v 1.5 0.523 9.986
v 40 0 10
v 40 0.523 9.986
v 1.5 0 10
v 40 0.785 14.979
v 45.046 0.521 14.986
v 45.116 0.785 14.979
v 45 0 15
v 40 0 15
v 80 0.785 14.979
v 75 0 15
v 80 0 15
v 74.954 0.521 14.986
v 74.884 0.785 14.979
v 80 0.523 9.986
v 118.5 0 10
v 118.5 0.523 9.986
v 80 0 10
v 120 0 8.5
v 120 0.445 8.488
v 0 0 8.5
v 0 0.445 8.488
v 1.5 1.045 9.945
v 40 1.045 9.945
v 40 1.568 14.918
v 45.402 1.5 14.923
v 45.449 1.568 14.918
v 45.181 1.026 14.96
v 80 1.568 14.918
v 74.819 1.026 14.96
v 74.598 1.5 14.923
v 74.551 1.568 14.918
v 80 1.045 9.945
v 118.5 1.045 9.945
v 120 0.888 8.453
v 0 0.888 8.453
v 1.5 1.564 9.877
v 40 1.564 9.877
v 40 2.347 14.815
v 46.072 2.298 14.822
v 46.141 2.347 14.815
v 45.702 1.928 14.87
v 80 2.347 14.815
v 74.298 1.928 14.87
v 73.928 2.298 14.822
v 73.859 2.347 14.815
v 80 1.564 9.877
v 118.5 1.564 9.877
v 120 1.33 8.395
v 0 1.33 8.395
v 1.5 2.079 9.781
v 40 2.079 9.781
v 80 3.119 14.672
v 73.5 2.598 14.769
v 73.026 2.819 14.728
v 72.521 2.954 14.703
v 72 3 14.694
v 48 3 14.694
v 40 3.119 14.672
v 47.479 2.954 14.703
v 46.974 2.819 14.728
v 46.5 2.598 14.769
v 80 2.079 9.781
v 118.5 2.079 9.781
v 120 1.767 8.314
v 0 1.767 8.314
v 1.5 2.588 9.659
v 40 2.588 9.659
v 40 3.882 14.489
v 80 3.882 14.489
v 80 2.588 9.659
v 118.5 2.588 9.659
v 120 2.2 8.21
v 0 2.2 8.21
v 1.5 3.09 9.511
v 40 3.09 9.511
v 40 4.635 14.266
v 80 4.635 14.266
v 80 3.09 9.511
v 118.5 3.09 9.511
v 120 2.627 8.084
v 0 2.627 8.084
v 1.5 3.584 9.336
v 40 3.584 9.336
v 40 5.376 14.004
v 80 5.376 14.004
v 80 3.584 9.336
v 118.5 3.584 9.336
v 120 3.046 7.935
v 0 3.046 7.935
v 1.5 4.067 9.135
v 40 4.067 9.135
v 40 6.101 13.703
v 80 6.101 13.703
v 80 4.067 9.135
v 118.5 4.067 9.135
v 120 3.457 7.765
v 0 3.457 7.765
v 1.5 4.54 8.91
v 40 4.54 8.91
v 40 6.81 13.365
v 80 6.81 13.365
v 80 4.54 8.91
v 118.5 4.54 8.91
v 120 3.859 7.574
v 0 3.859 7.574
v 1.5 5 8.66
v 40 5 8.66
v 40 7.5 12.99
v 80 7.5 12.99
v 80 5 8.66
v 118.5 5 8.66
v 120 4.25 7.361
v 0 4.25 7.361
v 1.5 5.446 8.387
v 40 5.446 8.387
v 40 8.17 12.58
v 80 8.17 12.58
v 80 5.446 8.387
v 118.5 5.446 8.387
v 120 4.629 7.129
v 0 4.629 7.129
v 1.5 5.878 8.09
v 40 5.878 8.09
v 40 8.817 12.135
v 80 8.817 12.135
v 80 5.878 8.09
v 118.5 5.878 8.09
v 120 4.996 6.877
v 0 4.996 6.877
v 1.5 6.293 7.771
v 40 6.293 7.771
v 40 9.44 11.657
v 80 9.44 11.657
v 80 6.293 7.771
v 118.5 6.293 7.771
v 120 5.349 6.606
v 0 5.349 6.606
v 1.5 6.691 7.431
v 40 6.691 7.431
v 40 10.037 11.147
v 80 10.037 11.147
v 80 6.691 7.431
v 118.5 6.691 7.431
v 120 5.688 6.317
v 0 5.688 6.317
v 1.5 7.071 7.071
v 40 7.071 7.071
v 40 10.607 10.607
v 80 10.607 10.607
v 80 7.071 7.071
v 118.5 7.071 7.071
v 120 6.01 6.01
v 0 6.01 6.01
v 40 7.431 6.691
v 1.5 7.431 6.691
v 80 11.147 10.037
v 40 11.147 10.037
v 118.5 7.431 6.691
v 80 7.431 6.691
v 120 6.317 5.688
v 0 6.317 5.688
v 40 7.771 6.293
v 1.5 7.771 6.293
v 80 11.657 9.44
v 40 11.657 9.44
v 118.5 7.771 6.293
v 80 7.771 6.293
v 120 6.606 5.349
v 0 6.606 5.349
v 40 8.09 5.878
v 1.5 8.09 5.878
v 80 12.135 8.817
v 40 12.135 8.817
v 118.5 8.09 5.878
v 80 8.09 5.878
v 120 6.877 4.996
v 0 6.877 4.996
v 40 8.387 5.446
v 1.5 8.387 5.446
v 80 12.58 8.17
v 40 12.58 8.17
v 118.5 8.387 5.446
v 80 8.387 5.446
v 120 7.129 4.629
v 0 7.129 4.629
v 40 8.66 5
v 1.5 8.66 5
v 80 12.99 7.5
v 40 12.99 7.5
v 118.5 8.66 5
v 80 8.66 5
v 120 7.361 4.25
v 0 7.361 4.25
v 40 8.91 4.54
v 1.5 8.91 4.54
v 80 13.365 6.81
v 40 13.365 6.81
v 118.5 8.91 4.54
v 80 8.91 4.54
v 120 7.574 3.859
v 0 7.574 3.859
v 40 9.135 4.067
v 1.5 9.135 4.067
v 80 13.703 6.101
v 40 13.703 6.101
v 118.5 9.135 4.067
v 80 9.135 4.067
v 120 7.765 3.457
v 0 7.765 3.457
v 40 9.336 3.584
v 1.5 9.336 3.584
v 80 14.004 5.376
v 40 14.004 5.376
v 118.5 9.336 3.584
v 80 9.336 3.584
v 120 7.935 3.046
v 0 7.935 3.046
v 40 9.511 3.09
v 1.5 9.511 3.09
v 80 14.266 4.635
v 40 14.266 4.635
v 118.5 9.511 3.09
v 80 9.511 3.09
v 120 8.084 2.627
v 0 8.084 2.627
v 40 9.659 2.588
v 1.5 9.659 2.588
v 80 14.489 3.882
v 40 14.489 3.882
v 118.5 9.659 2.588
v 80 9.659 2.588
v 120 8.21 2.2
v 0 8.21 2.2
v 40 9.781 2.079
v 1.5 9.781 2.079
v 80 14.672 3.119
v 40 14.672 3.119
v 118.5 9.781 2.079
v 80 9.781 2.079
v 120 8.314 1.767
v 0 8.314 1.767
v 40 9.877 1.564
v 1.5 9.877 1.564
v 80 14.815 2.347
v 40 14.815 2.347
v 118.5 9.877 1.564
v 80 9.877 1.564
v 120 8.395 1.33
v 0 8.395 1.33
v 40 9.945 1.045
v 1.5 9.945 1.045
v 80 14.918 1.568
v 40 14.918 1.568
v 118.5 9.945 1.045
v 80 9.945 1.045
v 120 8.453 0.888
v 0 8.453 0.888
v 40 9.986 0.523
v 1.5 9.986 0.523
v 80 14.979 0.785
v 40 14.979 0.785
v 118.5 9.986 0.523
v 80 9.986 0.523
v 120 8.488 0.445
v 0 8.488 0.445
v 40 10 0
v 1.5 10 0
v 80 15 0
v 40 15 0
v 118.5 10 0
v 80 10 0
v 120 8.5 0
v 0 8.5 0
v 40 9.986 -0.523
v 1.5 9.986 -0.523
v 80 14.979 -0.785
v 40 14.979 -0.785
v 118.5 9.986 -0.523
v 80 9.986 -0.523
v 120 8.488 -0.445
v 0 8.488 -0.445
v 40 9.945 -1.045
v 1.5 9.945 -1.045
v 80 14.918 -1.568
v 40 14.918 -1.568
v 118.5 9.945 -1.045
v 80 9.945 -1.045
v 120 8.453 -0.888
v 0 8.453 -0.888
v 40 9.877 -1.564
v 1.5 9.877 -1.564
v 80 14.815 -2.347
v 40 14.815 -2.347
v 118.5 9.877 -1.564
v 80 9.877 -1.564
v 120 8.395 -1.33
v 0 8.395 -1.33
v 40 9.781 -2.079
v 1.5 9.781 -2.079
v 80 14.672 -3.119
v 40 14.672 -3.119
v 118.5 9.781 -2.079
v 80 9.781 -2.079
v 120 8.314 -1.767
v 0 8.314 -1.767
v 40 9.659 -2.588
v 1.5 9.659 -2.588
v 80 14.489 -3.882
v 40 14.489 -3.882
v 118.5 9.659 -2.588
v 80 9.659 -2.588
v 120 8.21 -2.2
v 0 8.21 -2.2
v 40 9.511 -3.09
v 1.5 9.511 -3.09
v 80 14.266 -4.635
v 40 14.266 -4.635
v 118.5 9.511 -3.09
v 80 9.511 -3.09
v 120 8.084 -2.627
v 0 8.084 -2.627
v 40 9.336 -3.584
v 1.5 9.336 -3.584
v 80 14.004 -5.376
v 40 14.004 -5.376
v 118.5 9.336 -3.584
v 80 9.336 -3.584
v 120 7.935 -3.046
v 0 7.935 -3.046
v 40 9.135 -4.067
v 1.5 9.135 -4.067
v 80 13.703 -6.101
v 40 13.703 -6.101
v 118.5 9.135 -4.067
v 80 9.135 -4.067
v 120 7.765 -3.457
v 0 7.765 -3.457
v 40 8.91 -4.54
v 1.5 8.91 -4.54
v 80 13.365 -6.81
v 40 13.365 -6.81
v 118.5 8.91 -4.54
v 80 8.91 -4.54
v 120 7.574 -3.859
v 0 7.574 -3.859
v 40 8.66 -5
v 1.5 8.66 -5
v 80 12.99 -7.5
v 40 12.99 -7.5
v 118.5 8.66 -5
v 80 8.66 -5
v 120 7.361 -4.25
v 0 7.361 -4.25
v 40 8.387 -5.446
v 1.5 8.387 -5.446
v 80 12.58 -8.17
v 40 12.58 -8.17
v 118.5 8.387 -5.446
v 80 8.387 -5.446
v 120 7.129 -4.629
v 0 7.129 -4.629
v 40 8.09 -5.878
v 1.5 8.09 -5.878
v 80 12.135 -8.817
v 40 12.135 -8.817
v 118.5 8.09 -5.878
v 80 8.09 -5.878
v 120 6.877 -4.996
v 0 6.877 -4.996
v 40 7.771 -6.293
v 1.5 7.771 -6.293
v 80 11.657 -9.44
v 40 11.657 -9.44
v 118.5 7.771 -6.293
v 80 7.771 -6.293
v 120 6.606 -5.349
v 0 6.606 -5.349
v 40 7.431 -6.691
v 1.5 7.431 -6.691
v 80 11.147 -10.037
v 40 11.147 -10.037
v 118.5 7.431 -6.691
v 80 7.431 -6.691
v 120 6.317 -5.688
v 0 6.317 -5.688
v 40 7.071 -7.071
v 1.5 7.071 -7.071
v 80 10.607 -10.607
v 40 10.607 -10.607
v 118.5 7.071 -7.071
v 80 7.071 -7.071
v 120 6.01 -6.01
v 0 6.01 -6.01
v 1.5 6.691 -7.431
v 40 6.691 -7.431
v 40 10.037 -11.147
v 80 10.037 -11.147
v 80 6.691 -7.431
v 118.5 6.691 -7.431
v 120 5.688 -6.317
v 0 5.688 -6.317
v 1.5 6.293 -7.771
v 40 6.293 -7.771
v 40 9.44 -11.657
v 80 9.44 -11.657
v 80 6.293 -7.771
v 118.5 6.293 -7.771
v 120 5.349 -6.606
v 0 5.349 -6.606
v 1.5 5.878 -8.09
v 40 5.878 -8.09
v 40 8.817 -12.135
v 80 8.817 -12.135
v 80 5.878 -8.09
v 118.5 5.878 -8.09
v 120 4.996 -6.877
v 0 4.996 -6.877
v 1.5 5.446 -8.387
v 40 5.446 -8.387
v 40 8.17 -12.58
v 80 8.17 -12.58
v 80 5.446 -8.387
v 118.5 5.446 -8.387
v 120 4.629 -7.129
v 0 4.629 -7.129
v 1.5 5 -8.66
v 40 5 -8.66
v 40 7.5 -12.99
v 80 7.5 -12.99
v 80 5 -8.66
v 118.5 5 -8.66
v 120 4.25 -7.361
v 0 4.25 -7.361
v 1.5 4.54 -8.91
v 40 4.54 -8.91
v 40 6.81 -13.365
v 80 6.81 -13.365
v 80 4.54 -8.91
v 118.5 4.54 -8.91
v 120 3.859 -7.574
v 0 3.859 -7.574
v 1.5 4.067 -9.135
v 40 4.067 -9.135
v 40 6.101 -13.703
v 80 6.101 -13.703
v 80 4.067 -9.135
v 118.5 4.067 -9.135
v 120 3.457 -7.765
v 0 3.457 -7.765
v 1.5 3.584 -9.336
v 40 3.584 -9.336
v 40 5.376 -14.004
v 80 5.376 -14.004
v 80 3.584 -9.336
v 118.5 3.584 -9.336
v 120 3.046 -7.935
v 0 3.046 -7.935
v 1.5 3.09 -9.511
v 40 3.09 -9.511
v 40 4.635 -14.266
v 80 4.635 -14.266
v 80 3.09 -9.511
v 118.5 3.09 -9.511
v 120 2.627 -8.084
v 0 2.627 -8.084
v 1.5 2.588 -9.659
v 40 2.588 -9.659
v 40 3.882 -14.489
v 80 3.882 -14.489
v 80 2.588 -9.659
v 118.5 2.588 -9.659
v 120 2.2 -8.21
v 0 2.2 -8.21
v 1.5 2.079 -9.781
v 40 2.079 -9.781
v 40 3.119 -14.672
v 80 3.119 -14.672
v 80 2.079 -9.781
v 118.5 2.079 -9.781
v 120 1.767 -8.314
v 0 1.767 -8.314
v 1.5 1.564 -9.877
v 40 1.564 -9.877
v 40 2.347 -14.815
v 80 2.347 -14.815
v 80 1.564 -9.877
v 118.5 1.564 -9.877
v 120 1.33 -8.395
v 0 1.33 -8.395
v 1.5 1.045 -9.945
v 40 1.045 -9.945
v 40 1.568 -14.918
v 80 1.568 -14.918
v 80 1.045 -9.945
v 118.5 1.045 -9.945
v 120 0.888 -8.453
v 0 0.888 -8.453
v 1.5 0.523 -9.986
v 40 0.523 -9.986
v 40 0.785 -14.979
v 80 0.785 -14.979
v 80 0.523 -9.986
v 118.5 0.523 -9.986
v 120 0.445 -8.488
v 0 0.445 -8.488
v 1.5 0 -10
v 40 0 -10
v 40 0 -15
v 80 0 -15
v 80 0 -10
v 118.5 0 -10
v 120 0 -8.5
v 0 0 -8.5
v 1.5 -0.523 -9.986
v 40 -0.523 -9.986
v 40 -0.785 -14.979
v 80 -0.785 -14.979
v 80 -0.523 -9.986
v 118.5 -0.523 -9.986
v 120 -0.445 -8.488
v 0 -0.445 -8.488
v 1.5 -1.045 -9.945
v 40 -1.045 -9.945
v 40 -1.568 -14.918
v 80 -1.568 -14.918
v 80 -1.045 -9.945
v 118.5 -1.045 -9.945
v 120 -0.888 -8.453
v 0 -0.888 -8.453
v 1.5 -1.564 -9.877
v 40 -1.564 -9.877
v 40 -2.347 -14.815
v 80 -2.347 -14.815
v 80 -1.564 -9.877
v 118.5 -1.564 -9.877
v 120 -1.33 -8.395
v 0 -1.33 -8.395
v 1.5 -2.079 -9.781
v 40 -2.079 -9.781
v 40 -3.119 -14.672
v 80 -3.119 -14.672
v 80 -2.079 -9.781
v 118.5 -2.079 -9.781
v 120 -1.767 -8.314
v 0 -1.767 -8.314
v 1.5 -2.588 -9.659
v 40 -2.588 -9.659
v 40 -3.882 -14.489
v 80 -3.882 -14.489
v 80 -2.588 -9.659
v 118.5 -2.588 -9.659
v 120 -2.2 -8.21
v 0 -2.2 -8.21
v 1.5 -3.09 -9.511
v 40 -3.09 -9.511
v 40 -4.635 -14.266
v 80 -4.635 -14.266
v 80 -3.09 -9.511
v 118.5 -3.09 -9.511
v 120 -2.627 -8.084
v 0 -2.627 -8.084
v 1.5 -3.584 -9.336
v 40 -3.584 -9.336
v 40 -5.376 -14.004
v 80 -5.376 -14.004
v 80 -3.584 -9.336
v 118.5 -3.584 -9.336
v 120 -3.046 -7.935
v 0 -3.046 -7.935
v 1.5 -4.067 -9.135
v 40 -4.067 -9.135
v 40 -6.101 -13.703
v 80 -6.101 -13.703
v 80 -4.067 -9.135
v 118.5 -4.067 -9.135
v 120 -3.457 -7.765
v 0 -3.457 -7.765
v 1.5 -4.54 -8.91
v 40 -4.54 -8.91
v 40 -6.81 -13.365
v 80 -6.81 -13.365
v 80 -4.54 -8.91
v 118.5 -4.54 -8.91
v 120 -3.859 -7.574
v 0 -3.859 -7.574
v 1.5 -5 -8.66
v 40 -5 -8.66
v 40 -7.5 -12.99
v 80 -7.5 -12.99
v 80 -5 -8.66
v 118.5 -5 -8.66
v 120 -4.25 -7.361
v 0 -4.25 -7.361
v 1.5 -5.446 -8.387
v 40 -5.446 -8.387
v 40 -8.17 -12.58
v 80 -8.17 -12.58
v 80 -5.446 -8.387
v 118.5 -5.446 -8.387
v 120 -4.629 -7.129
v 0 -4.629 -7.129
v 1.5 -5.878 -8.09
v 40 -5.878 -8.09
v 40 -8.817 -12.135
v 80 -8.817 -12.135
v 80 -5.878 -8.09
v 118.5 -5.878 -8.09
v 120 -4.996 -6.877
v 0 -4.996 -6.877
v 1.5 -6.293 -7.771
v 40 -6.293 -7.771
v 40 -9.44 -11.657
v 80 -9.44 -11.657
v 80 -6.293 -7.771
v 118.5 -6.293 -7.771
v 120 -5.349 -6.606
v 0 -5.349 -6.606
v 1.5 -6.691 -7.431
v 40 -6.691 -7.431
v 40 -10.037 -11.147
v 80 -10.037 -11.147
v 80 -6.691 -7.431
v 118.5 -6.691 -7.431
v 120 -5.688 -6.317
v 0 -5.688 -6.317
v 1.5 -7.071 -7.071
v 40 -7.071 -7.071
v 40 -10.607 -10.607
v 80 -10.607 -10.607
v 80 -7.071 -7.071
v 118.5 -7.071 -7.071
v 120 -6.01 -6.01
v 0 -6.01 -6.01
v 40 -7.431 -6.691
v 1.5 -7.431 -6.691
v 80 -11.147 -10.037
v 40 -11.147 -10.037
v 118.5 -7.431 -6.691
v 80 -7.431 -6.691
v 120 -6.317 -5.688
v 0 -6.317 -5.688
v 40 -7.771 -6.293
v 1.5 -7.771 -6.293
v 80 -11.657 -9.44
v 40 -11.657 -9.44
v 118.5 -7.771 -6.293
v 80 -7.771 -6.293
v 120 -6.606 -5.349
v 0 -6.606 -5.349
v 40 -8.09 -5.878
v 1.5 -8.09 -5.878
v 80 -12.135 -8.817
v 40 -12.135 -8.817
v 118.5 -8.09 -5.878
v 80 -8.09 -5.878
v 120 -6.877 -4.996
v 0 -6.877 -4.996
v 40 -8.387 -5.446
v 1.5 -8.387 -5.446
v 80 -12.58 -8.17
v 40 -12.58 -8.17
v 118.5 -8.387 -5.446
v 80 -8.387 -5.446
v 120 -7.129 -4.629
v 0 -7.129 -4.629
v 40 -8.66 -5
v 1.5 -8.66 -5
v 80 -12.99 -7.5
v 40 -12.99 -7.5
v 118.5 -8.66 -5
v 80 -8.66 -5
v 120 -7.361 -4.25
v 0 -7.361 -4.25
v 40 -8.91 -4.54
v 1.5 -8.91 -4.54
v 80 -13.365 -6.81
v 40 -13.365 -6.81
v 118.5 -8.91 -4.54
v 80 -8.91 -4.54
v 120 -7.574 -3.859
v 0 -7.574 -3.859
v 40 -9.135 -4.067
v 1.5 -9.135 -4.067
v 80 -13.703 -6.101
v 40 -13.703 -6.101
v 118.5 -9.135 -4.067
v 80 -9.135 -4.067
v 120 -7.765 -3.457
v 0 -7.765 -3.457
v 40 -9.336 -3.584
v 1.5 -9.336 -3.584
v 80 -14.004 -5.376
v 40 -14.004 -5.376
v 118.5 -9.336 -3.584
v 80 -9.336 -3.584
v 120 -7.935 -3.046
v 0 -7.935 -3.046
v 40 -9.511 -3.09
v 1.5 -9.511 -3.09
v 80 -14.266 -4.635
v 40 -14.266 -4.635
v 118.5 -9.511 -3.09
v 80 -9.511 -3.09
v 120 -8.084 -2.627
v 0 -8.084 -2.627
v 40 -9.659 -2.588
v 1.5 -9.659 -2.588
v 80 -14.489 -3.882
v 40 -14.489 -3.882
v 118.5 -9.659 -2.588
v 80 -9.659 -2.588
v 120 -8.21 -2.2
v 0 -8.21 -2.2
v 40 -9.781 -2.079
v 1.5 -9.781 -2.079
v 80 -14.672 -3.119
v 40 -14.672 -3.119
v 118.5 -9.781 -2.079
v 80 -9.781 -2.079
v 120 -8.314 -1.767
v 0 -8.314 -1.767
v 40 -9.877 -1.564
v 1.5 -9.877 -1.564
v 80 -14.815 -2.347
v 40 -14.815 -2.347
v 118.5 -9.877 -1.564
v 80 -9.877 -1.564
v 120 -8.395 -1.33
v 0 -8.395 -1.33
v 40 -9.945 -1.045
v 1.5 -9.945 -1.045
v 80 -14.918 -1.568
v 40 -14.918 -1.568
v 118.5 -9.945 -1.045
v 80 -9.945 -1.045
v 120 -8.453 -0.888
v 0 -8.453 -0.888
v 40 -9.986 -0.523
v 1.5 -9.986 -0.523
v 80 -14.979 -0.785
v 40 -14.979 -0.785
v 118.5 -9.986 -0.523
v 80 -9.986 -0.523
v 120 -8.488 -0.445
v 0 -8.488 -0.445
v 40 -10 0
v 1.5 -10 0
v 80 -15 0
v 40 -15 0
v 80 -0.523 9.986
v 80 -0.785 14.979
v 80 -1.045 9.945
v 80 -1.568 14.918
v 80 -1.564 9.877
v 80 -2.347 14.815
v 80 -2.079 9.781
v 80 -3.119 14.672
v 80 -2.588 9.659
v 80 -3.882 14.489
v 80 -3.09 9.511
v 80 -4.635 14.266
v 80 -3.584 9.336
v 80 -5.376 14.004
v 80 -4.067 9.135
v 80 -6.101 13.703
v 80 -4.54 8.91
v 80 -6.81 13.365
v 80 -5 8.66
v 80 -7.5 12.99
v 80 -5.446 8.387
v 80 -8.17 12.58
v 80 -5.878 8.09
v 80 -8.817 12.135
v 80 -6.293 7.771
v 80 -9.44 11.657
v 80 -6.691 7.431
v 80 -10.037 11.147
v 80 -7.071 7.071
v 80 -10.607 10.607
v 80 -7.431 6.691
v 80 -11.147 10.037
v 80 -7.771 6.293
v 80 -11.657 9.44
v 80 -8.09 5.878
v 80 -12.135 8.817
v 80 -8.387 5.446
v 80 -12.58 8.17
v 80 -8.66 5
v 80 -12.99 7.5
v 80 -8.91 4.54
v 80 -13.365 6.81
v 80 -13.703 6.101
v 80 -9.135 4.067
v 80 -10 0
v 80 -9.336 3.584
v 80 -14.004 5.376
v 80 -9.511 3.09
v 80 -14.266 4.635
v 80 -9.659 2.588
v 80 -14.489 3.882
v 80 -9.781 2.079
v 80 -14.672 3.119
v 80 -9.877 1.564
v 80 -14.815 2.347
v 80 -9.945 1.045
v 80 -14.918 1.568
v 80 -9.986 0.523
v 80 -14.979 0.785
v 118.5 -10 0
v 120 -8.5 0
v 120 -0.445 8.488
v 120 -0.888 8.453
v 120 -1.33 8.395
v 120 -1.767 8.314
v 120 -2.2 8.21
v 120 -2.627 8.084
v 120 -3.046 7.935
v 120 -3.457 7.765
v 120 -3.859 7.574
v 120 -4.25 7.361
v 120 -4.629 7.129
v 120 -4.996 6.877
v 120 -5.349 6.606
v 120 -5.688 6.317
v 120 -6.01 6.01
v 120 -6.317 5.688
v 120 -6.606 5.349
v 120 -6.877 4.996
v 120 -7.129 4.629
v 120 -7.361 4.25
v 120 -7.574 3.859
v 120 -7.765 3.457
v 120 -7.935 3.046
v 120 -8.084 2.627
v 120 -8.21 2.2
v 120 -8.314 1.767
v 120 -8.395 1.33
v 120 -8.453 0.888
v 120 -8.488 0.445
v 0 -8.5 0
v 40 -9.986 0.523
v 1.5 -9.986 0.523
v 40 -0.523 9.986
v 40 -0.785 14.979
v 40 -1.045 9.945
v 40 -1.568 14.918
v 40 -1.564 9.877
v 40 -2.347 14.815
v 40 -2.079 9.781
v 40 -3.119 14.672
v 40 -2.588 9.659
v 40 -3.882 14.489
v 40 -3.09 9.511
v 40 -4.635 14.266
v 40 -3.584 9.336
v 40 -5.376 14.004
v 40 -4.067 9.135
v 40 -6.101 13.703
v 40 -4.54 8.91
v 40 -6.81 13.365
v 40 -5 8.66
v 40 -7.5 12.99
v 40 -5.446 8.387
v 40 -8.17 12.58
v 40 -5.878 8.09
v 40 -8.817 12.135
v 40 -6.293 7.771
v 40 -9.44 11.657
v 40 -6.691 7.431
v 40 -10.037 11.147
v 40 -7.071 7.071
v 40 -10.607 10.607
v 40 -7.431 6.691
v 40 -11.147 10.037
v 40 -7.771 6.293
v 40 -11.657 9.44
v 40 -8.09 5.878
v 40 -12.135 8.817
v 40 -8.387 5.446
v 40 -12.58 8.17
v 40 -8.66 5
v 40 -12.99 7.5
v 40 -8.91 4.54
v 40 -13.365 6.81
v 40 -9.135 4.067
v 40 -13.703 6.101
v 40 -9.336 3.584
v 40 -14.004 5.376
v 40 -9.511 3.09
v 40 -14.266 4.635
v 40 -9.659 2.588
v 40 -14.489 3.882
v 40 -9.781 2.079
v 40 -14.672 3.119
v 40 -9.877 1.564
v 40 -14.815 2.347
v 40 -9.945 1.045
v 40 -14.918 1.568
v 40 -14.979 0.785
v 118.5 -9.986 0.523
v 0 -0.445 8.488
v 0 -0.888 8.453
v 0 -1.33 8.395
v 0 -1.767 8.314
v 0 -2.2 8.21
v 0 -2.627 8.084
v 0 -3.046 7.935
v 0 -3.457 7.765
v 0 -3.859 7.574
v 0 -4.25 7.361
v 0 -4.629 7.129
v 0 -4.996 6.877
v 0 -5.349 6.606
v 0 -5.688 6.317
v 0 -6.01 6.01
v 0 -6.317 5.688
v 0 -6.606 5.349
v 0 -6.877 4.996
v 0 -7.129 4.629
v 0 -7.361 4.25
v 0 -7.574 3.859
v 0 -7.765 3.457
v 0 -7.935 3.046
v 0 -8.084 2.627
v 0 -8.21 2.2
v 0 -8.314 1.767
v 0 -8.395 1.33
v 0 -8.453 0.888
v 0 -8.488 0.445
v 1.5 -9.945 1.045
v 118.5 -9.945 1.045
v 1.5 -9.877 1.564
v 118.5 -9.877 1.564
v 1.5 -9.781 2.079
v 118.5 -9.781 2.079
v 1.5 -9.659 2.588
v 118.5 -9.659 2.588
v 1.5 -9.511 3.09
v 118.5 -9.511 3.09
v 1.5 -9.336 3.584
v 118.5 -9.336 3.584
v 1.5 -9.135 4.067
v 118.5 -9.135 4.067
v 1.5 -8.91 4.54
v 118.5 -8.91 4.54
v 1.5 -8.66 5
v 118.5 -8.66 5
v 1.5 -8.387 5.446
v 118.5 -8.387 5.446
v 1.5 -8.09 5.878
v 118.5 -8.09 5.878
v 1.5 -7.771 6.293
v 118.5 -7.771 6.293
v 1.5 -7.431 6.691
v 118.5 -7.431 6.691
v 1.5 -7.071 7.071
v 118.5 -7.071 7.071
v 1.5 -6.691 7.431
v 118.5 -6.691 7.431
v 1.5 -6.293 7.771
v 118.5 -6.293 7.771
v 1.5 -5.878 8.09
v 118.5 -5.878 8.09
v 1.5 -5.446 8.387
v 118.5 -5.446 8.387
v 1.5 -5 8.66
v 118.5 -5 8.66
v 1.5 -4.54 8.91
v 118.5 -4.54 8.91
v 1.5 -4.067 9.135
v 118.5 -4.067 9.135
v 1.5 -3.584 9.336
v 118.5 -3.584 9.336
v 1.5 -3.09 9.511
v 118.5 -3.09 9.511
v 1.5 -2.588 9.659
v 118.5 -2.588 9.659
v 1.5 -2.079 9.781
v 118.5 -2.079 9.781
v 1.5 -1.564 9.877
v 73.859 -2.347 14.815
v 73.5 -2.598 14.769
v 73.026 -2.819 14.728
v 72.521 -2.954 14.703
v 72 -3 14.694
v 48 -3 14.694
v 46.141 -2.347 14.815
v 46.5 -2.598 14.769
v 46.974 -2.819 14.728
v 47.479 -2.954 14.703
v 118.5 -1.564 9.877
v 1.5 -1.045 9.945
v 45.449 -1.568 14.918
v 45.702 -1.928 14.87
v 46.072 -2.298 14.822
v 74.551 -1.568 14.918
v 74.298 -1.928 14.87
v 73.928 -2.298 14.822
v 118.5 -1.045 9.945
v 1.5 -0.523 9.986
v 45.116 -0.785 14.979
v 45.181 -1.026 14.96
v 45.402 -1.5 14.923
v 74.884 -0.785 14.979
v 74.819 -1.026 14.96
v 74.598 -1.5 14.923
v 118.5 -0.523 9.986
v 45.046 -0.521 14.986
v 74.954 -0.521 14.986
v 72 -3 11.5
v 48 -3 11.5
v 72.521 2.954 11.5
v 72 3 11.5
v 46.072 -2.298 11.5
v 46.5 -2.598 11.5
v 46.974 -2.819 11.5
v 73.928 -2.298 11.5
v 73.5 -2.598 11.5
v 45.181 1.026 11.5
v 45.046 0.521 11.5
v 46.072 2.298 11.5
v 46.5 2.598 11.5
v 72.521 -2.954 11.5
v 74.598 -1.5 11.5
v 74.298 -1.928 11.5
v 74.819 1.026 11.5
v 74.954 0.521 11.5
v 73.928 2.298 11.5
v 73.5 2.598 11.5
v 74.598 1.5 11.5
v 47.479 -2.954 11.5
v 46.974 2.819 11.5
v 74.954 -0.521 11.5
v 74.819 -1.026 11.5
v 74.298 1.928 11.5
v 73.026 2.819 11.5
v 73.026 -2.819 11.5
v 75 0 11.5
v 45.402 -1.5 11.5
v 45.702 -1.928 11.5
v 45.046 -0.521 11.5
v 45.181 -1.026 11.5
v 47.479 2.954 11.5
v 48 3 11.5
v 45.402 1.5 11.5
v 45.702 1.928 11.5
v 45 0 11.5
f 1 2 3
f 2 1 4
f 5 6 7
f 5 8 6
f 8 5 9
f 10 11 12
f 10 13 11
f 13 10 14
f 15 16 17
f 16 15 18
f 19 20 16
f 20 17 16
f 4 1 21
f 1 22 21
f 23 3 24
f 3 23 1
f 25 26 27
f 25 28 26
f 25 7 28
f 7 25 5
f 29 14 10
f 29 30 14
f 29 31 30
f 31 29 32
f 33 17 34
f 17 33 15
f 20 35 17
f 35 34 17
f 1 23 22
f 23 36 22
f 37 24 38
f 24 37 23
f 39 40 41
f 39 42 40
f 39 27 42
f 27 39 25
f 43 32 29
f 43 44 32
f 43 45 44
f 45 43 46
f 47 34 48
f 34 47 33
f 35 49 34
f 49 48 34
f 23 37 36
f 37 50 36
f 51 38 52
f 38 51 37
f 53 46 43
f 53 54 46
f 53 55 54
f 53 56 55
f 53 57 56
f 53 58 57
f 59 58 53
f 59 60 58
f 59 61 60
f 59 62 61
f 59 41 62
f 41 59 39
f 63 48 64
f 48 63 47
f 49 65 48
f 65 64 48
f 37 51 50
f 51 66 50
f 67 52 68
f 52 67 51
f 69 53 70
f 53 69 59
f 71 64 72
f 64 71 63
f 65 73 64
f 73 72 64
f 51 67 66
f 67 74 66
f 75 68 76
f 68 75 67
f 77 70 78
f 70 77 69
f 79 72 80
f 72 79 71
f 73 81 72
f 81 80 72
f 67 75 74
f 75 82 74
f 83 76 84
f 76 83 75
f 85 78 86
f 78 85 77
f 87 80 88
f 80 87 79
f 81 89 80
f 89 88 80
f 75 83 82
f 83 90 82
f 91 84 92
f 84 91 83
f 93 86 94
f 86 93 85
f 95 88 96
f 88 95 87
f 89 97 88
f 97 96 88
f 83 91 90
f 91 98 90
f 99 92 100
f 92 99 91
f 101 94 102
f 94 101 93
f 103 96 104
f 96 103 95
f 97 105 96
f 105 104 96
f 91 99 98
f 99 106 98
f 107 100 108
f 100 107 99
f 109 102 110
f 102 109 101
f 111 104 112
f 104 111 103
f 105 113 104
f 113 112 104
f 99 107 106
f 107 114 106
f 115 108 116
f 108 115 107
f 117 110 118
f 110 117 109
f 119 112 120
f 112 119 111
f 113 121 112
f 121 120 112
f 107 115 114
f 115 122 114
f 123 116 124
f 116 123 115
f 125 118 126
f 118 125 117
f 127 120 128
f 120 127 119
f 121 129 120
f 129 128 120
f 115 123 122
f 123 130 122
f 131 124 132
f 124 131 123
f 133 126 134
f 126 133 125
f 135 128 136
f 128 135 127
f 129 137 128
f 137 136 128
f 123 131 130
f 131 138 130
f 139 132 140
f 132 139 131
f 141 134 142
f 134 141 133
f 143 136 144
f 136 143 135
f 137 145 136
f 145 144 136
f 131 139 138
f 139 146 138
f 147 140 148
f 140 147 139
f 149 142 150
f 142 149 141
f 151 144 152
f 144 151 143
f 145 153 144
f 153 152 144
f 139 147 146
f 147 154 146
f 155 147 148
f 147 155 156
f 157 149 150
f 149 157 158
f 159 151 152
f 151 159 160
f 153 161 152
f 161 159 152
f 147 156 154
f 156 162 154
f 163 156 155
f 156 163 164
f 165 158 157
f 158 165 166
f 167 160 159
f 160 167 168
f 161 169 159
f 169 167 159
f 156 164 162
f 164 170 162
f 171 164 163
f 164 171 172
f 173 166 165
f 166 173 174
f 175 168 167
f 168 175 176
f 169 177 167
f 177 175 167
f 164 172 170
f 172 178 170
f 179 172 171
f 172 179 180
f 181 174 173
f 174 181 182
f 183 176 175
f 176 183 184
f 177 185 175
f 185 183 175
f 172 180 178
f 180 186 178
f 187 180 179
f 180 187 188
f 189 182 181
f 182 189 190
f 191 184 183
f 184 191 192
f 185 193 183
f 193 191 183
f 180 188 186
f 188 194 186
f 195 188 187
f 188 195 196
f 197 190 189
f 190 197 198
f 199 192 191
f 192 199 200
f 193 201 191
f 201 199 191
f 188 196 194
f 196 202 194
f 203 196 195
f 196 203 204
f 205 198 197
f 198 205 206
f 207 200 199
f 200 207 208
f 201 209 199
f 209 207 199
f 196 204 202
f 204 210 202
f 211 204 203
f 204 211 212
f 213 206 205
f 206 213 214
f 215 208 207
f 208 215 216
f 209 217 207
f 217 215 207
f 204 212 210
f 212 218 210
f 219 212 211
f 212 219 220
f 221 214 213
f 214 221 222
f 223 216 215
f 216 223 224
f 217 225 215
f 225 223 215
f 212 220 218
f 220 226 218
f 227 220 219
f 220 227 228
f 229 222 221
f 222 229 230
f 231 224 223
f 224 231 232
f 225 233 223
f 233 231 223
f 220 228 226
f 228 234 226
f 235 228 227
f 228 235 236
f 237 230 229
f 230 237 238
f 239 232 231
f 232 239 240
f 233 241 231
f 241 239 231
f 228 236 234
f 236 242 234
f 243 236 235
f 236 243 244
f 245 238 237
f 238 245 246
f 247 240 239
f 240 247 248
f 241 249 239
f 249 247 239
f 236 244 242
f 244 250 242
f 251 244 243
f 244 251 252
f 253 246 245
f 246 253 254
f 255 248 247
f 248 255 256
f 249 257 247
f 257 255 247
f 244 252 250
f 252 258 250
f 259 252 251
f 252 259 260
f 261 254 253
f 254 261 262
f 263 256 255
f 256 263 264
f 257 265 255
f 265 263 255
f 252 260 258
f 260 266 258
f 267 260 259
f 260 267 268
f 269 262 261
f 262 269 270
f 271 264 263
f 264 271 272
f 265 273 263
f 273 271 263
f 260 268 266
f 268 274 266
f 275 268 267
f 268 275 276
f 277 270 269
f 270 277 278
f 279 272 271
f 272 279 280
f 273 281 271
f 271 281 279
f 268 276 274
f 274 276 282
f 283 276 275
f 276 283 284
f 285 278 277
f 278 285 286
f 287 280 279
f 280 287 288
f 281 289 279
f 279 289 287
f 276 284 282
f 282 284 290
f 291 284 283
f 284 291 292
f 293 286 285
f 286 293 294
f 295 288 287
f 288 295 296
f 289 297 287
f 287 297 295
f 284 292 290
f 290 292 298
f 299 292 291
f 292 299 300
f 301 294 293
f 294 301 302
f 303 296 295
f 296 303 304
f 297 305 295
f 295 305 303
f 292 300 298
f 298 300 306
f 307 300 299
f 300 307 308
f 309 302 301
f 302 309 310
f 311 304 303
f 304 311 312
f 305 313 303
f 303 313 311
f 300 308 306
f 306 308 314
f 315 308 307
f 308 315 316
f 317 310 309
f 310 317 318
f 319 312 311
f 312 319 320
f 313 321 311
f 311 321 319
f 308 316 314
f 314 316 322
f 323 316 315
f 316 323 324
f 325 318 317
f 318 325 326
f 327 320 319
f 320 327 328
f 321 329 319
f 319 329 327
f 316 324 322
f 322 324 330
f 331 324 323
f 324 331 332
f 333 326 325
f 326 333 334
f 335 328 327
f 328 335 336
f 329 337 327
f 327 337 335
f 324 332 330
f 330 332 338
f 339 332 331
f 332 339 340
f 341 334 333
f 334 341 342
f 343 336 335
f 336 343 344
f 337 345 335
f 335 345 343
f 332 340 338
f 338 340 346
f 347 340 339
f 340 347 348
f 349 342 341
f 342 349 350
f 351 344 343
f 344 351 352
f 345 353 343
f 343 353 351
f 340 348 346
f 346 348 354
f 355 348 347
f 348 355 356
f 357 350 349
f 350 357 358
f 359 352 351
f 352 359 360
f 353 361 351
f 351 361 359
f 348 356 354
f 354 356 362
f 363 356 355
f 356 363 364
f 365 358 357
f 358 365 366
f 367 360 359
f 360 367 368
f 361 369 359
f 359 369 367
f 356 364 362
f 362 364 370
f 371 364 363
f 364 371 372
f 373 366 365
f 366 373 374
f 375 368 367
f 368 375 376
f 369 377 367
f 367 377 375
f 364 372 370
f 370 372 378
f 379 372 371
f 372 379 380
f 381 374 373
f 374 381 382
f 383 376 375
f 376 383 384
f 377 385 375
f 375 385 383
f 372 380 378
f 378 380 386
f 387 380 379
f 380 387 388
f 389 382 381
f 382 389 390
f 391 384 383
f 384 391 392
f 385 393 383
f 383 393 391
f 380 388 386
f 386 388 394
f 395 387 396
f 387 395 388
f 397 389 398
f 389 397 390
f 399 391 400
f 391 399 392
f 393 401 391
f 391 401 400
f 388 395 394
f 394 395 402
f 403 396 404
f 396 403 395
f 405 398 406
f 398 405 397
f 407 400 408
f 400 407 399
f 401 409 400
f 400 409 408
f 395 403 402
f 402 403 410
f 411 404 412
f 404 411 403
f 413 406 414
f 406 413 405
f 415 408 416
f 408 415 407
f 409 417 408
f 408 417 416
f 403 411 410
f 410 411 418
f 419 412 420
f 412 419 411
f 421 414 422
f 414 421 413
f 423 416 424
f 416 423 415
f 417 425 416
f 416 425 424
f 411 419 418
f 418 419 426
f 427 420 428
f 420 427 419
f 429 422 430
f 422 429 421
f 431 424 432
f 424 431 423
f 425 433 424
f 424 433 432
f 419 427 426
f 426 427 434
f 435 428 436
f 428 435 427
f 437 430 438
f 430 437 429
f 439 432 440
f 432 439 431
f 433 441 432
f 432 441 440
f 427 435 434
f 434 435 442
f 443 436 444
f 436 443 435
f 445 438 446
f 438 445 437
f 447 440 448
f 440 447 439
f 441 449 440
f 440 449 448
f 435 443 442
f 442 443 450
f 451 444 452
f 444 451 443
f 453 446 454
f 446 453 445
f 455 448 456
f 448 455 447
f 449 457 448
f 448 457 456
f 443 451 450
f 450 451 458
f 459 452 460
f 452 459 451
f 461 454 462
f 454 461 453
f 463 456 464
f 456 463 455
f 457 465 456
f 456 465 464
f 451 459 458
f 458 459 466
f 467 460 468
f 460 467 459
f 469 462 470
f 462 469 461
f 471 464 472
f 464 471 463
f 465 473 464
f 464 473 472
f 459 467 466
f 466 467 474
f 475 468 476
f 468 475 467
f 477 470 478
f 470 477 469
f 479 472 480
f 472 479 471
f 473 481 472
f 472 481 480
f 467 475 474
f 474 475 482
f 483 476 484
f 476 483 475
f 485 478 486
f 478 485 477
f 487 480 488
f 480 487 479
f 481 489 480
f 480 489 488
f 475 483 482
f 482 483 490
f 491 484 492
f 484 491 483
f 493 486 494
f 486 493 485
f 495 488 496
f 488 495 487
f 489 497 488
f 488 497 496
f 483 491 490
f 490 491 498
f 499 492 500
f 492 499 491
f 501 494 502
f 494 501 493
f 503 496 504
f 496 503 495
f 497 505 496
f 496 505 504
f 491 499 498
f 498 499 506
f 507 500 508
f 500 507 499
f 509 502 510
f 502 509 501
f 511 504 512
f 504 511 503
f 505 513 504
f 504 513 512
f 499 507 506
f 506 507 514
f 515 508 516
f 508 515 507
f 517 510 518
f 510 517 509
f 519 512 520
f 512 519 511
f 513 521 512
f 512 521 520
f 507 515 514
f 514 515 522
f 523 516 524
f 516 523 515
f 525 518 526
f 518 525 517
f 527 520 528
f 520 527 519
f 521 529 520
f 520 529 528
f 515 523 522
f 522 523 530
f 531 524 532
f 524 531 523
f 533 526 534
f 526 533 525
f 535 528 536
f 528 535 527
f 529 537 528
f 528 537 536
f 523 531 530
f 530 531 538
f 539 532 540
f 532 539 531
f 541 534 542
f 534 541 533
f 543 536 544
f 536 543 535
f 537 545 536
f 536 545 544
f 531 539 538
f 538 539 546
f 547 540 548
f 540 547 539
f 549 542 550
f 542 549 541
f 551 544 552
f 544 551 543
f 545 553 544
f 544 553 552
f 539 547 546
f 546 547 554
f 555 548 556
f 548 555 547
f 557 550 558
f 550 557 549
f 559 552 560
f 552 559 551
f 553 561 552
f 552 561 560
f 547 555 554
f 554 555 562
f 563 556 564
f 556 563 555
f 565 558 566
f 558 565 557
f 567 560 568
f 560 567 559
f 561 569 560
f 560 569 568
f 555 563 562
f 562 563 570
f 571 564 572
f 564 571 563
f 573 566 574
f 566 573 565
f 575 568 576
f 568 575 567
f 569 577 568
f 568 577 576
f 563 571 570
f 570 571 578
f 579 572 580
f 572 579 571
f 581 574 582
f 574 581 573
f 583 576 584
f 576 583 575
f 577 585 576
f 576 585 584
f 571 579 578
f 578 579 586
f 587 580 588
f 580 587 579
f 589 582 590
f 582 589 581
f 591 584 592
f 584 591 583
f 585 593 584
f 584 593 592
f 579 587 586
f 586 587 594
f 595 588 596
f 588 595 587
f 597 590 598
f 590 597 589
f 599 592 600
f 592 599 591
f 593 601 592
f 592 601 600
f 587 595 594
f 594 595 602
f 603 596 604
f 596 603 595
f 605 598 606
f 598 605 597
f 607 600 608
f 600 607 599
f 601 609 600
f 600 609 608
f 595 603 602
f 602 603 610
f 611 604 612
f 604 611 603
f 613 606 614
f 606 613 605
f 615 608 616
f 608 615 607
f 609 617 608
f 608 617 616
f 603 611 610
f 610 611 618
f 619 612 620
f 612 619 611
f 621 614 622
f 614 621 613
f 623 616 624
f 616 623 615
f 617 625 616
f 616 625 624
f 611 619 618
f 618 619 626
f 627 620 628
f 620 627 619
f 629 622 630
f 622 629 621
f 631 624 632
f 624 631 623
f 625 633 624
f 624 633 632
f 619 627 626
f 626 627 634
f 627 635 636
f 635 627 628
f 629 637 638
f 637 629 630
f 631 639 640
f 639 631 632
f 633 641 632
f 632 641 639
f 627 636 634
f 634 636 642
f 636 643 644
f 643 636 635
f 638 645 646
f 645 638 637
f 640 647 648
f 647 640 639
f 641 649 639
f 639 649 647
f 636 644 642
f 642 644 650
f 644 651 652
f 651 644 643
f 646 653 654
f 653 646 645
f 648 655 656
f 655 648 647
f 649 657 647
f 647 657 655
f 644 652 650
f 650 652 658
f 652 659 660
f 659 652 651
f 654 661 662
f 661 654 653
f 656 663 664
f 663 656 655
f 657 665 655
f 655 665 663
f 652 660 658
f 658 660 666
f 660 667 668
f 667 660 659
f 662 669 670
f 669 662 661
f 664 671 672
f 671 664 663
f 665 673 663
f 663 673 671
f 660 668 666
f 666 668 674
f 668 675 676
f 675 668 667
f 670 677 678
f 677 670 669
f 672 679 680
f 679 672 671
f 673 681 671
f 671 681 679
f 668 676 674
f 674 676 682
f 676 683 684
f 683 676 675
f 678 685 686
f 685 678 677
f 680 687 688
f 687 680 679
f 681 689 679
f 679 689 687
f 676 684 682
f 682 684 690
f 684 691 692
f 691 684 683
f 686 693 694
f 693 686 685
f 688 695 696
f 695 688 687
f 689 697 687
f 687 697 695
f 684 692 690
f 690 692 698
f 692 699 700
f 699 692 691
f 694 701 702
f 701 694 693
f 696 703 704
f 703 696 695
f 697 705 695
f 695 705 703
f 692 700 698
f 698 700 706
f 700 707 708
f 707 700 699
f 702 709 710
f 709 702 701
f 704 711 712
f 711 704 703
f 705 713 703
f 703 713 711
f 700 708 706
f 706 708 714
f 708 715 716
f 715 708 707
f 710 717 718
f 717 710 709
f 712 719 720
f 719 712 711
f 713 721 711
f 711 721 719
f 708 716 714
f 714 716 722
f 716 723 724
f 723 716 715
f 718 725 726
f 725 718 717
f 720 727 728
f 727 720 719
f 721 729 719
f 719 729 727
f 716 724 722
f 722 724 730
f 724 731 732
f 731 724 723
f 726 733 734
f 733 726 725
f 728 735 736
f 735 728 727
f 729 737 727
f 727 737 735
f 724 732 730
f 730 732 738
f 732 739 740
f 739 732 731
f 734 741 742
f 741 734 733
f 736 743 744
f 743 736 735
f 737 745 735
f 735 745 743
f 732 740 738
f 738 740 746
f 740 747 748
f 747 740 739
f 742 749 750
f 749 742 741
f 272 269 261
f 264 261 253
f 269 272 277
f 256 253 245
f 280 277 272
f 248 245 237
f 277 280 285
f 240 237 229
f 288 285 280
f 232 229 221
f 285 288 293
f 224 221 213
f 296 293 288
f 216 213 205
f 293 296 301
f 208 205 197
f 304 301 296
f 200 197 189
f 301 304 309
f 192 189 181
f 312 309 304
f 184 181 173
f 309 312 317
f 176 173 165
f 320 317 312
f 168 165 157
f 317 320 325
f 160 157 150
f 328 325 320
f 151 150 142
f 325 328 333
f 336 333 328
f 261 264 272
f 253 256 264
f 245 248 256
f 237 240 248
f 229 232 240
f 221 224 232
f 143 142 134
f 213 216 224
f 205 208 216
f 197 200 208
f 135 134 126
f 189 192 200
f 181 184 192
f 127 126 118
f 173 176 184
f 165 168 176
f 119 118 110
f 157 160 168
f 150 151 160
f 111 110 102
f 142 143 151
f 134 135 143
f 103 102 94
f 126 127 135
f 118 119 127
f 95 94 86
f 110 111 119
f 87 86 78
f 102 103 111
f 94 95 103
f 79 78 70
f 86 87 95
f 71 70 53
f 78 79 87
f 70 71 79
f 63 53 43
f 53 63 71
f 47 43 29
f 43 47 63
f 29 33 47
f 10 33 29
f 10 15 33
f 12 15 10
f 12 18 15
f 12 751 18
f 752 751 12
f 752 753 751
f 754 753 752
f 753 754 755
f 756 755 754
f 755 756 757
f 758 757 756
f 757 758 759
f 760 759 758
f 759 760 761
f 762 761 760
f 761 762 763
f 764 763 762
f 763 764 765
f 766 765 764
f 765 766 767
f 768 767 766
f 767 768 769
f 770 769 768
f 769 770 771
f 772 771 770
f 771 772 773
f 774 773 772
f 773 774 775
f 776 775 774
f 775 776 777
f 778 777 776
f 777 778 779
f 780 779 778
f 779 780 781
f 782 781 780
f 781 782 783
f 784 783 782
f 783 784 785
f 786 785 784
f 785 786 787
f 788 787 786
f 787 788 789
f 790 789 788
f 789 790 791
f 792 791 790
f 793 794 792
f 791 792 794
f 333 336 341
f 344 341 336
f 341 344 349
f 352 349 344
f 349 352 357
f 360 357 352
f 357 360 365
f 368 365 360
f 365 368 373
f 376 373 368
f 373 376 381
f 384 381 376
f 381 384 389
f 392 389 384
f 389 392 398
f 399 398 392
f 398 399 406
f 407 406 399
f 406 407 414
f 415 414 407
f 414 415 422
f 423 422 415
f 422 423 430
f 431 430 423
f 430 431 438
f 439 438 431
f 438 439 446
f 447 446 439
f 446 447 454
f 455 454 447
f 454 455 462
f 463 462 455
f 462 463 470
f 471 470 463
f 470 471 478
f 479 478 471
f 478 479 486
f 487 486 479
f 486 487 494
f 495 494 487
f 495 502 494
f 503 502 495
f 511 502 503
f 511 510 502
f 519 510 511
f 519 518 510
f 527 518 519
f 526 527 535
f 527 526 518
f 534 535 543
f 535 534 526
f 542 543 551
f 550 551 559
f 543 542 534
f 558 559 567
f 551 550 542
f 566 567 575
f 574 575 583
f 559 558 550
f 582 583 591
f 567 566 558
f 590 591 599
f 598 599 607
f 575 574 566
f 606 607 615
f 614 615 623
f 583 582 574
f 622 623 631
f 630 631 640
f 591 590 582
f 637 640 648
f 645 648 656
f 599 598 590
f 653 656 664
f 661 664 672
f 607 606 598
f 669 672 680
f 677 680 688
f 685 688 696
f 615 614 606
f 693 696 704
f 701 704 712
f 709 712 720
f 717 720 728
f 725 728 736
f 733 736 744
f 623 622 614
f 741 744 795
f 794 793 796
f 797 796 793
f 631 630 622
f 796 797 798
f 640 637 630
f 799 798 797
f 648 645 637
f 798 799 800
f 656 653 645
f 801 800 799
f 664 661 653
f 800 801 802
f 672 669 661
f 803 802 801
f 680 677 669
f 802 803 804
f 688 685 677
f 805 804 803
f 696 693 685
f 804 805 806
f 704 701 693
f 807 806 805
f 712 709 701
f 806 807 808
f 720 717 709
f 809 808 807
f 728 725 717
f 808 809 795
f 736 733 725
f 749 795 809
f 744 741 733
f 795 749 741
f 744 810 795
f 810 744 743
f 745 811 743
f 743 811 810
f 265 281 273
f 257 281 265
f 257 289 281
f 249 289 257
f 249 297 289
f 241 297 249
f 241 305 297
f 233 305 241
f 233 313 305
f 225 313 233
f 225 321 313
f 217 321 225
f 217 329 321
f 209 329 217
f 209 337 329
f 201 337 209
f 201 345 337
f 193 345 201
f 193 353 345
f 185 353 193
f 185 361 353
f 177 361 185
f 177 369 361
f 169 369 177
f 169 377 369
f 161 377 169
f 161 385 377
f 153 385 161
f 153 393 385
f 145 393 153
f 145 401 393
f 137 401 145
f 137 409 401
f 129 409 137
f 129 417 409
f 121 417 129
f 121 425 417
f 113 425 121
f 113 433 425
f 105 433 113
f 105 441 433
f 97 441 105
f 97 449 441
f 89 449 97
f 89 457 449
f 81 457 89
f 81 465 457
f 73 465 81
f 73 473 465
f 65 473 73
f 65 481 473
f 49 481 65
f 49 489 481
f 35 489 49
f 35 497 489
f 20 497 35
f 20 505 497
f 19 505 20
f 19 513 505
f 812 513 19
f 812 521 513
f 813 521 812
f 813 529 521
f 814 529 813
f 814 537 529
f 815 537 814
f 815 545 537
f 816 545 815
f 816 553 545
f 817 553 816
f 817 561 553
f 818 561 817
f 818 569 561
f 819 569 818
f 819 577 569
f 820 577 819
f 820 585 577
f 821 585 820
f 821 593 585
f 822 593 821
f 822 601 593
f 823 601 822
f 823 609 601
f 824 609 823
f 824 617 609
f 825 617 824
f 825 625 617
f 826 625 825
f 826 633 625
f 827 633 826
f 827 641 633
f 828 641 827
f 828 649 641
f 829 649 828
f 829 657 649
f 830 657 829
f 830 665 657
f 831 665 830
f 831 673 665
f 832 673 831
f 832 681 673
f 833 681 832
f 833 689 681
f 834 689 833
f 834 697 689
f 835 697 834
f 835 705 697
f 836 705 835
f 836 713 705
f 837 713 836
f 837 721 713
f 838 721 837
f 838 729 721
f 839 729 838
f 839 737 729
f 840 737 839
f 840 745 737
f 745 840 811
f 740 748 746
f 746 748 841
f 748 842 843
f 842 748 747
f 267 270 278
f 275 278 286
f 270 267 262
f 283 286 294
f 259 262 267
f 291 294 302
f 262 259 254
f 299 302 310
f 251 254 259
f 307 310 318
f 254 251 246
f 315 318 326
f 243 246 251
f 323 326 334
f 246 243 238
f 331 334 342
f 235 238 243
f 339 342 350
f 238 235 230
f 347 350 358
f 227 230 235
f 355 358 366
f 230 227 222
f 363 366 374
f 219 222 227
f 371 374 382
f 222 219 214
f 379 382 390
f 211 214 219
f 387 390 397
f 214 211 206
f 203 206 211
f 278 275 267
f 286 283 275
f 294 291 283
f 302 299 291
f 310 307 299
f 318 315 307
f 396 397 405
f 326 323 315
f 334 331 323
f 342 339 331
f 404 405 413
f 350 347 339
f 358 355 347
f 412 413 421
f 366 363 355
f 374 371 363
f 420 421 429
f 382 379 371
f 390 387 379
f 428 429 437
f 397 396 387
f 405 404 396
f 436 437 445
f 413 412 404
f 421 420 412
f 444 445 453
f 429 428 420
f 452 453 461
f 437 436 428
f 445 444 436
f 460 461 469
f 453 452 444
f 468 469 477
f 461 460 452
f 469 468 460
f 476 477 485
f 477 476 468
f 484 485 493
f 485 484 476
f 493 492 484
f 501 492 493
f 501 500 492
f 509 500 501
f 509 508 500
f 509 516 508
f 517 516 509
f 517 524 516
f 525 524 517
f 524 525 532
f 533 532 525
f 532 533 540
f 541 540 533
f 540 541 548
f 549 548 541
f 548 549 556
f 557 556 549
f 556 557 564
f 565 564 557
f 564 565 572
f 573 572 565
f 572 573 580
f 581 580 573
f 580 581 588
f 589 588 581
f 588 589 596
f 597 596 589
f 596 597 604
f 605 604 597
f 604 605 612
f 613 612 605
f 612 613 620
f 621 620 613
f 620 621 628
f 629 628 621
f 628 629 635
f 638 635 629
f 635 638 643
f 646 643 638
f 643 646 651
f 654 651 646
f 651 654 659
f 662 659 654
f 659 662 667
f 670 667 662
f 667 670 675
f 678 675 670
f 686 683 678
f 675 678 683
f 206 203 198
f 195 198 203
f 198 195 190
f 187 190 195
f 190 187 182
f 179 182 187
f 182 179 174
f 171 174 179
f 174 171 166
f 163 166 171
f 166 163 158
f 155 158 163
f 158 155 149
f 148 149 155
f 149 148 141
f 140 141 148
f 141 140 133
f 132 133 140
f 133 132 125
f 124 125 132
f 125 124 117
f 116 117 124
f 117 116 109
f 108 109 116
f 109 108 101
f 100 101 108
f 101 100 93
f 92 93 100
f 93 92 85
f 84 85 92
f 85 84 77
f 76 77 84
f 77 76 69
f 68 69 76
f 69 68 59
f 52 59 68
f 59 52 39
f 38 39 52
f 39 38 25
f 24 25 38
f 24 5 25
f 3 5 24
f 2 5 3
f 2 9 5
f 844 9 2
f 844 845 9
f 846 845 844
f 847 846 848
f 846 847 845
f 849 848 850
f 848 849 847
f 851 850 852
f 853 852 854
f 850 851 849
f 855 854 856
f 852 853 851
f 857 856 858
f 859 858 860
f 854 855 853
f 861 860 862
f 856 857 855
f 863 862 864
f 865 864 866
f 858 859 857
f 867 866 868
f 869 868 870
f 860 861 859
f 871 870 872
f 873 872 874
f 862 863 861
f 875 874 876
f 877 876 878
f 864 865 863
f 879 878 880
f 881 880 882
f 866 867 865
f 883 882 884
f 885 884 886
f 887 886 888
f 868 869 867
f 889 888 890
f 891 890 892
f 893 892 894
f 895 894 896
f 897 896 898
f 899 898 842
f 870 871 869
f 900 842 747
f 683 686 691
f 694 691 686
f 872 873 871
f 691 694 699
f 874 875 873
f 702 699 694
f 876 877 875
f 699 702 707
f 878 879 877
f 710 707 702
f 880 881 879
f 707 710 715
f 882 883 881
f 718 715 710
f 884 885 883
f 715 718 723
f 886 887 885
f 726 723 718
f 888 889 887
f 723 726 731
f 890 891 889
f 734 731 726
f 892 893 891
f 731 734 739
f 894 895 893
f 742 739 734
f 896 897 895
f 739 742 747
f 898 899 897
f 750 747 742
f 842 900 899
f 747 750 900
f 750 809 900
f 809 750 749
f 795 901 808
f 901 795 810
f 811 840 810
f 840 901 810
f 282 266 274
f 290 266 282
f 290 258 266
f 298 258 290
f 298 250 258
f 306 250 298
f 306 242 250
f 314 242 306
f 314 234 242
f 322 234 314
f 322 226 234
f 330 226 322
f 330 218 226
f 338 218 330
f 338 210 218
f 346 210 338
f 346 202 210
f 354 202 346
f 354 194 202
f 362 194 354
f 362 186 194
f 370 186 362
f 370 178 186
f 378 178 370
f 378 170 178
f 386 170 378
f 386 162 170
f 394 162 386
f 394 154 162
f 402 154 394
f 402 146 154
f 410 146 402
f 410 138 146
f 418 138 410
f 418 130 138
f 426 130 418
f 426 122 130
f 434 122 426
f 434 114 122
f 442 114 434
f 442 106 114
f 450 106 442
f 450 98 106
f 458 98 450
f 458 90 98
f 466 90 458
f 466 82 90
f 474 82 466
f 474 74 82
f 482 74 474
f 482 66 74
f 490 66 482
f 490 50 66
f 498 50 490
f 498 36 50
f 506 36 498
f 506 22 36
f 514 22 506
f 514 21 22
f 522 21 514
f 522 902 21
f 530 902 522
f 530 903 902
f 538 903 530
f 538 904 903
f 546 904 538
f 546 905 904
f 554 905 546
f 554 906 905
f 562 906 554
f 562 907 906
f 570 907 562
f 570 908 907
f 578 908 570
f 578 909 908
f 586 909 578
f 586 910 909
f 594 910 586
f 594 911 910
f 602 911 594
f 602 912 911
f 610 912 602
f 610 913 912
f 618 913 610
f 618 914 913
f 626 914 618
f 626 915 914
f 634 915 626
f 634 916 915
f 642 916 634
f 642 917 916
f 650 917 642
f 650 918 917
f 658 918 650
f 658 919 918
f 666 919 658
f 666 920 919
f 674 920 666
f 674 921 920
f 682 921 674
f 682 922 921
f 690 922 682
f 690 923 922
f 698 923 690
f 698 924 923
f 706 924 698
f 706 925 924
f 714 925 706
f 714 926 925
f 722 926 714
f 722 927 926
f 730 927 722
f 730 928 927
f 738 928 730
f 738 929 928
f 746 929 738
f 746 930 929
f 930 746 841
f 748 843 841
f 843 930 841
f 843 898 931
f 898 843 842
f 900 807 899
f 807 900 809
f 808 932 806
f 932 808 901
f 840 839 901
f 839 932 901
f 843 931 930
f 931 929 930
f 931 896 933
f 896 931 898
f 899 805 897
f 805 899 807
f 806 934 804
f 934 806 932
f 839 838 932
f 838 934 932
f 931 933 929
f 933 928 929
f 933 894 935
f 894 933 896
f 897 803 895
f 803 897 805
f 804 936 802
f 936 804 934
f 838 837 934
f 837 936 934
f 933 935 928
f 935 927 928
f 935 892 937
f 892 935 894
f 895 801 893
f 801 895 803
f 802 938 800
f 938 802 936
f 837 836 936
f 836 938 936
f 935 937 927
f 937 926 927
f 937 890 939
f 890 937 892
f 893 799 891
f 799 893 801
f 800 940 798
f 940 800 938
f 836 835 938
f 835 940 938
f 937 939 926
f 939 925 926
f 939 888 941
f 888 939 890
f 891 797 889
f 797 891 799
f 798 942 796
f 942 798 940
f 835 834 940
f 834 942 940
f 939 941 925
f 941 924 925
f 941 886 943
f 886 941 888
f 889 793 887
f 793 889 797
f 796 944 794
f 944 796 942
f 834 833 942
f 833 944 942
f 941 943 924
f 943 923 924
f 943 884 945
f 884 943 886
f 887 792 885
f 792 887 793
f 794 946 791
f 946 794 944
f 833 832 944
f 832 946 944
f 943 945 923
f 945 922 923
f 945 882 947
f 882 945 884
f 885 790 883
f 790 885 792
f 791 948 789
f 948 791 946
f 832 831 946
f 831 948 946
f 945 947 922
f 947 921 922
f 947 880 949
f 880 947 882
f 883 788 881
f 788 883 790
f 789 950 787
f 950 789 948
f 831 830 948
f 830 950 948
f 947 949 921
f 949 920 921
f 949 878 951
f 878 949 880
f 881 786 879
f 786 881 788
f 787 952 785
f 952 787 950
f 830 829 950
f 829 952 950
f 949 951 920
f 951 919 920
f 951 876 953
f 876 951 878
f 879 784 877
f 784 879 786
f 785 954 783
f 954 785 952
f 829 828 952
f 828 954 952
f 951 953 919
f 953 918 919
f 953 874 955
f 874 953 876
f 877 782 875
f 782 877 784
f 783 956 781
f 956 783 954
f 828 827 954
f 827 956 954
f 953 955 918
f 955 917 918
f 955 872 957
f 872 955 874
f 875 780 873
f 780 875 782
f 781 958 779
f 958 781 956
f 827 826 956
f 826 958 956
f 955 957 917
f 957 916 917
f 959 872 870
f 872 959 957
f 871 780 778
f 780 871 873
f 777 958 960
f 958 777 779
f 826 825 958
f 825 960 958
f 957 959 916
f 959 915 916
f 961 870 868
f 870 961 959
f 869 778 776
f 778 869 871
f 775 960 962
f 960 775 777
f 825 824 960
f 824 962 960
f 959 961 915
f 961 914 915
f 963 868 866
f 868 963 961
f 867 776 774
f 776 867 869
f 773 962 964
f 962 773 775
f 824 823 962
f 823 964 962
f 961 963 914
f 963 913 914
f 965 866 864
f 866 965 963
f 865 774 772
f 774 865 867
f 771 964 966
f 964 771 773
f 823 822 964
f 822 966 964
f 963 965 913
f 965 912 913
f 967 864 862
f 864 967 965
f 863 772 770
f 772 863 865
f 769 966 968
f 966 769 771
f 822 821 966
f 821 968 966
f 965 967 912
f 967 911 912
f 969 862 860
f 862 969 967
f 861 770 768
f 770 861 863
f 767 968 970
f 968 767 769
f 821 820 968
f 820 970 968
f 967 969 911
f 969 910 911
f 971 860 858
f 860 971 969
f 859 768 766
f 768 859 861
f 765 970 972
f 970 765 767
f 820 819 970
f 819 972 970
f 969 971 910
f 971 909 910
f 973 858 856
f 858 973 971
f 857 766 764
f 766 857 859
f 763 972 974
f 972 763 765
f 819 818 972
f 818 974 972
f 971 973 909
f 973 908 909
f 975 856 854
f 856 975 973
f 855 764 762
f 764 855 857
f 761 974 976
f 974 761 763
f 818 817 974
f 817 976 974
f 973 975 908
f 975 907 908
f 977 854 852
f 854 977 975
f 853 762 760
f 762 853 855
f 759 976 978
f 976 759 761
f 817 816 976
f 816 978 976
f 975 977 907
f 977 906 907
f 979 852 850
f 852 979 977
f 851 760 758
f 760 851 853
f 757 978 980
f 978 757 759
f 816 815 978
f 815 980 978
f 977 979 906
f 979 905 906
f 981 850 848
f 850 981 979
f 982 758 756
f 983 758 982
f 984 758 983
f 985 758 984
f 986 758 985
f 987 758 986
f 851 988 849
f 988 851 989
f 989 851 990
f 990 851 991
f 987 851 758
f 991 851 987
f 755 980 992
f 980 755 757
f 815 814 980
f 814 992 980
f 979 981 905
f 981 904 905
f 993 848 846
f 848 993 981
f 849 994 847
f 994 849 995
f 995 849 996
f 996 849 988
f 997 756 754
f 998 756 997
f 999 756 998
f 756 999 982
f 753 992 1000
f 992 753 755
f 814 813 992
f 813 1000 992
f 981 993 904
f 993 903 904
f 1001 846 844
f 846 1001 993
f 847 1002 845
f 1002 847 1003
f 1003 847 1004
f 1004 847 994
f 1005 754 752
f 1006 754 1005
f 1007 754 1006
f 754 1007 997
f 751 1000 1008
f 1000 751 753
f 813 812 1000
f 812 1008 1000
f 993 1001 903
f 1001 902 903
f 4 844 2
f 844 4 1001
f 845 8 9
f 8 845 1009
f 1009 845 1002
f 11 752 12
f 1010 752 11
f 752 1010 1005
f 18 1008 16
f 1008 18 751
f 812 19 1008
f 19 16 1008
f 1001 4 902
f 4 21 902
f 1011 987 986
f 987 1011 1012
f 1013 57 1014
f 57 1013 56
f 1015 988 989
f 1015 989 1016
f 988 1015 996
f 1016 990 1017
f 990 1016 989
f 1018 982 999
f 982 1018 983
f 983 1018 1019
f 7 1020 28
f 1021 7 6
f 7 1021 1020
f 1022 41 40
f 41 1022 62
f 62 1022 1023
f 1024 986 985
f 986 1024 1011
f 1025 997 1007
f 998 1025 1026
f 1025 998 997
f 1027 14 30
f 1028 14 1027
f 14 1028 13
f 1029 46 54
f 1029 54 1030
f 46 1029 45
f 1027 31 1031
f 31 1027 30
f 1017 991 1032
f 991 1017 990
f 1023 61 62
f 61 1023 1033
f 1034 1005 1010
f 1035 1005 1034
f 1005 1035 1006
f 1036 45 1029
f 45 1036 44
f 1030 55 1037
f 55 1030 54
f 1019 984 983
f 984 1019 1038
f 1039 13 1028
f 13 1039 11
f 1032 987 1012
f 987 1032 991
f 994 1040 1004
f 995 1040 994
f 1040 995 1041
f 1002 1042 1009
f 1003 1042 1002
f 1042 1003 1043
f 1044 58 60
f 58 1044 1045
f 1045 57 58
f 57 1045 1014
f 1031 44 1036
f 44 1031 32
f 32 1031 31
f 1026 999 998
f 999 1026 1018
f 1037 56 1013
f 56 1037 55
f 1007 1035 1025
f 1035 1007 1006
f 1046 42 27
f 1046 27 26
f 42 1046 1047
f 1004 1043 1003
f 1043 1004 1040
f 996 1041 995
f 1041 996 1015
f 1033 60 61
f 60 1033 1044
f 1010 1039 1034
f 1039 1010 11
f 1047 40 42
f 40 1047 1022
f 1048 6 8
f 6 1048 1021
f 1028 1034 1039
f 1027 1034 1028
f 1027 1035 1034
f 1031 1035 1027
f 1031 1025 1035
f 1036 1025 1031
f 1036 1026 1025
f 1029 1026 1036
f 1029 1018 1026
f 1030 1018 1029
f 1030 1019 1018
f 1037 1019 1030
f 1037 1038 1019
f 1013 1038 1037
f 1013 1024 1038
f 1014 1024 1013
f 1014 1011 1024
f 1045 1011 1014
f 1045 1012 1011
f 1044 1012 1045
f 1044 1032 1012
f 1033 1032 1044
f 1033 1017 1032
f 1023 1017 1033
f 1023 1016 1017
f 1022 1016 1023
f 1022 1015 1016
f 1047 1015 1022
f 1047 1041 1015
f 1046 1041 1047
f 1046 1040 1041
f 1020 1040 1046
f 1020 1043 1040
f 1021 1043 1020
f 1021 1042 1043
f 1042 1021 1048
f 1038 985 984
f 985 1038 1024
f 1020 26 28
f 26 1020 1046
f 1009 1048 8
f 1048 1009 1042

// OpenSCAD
// Stepped Shaft with Keyway
// Total Length: 120 mm along X axis

$fn = 120;

// Section Dimensions
d1 = 20;          // Diameter section 1 (mm)
l1 = 40;          // Length section 1 (mm)

d2 = 30;          // Diameter section 2 (mm)
l2 = 40;          // Length section 2 (mm)

d3 = 20;          // Diameter section 3 (mm)
l3 = 40;          // Length section 3 (mm)

chamfer = 1.5;    // End chamfer size (mm)

// Keyway Dimensions (DIN 6885 standard style for 30mm shaft)
key_w = 6;        // Keyway width (mm)
key_d = 3.5;      // Keyway depth (mm)
key_l = 30;       // Keyway length (mm)

// Radii calculations
r1 = d1 / 2;
r2 = d2 / 2;
r3 = d3 / 2;
total_length = l1 + l2 + l3;

module shaft_body() {
    // 2D revolution profile (radius vs length along shaft axis)
    profile_points = [
        [0, 0],
        [r1 - chamfer, 0],
        [r1, chamfer],
        [r1, l1],
        [r2, l1],
        [r2, l1 + l2],
        [r3, l1 + l2],
        [r3, total_length - chamfer],
        [r3 - chamfer, total_length],
        [0, total_length]
    ];
    
    // Extrude around Z axis, then rotate so shaft lies along X axis
    rotate([0, 90, 0])
        rotate_extrude($fn = $fn)
            polygon(profile_points);
}

module keyway_cutter() {
    x_center = l1 + l2 / 2;
    x_start  = x_center - key_l / 2 + key_w / 2;
    x_end    = x_center + key_l / 2 - key_w / 2;
    z_bottom = r2 - key_d;
    
    // Rounded-end slot cutout on top of middle section
    hull() {
        translate([x_start, 0, z_bottom])
            cylinder(r = key_w / 2, h = key_d + 5, $fn = 36);
        translate([x_end, 0, z_bottom])
            cylinder(r = key_w / 2, h = key_d + 5, $fn = 36);
    }
}

// Final Assembly
difference() {
    shaft_body();
    keyway_cutter();
}
